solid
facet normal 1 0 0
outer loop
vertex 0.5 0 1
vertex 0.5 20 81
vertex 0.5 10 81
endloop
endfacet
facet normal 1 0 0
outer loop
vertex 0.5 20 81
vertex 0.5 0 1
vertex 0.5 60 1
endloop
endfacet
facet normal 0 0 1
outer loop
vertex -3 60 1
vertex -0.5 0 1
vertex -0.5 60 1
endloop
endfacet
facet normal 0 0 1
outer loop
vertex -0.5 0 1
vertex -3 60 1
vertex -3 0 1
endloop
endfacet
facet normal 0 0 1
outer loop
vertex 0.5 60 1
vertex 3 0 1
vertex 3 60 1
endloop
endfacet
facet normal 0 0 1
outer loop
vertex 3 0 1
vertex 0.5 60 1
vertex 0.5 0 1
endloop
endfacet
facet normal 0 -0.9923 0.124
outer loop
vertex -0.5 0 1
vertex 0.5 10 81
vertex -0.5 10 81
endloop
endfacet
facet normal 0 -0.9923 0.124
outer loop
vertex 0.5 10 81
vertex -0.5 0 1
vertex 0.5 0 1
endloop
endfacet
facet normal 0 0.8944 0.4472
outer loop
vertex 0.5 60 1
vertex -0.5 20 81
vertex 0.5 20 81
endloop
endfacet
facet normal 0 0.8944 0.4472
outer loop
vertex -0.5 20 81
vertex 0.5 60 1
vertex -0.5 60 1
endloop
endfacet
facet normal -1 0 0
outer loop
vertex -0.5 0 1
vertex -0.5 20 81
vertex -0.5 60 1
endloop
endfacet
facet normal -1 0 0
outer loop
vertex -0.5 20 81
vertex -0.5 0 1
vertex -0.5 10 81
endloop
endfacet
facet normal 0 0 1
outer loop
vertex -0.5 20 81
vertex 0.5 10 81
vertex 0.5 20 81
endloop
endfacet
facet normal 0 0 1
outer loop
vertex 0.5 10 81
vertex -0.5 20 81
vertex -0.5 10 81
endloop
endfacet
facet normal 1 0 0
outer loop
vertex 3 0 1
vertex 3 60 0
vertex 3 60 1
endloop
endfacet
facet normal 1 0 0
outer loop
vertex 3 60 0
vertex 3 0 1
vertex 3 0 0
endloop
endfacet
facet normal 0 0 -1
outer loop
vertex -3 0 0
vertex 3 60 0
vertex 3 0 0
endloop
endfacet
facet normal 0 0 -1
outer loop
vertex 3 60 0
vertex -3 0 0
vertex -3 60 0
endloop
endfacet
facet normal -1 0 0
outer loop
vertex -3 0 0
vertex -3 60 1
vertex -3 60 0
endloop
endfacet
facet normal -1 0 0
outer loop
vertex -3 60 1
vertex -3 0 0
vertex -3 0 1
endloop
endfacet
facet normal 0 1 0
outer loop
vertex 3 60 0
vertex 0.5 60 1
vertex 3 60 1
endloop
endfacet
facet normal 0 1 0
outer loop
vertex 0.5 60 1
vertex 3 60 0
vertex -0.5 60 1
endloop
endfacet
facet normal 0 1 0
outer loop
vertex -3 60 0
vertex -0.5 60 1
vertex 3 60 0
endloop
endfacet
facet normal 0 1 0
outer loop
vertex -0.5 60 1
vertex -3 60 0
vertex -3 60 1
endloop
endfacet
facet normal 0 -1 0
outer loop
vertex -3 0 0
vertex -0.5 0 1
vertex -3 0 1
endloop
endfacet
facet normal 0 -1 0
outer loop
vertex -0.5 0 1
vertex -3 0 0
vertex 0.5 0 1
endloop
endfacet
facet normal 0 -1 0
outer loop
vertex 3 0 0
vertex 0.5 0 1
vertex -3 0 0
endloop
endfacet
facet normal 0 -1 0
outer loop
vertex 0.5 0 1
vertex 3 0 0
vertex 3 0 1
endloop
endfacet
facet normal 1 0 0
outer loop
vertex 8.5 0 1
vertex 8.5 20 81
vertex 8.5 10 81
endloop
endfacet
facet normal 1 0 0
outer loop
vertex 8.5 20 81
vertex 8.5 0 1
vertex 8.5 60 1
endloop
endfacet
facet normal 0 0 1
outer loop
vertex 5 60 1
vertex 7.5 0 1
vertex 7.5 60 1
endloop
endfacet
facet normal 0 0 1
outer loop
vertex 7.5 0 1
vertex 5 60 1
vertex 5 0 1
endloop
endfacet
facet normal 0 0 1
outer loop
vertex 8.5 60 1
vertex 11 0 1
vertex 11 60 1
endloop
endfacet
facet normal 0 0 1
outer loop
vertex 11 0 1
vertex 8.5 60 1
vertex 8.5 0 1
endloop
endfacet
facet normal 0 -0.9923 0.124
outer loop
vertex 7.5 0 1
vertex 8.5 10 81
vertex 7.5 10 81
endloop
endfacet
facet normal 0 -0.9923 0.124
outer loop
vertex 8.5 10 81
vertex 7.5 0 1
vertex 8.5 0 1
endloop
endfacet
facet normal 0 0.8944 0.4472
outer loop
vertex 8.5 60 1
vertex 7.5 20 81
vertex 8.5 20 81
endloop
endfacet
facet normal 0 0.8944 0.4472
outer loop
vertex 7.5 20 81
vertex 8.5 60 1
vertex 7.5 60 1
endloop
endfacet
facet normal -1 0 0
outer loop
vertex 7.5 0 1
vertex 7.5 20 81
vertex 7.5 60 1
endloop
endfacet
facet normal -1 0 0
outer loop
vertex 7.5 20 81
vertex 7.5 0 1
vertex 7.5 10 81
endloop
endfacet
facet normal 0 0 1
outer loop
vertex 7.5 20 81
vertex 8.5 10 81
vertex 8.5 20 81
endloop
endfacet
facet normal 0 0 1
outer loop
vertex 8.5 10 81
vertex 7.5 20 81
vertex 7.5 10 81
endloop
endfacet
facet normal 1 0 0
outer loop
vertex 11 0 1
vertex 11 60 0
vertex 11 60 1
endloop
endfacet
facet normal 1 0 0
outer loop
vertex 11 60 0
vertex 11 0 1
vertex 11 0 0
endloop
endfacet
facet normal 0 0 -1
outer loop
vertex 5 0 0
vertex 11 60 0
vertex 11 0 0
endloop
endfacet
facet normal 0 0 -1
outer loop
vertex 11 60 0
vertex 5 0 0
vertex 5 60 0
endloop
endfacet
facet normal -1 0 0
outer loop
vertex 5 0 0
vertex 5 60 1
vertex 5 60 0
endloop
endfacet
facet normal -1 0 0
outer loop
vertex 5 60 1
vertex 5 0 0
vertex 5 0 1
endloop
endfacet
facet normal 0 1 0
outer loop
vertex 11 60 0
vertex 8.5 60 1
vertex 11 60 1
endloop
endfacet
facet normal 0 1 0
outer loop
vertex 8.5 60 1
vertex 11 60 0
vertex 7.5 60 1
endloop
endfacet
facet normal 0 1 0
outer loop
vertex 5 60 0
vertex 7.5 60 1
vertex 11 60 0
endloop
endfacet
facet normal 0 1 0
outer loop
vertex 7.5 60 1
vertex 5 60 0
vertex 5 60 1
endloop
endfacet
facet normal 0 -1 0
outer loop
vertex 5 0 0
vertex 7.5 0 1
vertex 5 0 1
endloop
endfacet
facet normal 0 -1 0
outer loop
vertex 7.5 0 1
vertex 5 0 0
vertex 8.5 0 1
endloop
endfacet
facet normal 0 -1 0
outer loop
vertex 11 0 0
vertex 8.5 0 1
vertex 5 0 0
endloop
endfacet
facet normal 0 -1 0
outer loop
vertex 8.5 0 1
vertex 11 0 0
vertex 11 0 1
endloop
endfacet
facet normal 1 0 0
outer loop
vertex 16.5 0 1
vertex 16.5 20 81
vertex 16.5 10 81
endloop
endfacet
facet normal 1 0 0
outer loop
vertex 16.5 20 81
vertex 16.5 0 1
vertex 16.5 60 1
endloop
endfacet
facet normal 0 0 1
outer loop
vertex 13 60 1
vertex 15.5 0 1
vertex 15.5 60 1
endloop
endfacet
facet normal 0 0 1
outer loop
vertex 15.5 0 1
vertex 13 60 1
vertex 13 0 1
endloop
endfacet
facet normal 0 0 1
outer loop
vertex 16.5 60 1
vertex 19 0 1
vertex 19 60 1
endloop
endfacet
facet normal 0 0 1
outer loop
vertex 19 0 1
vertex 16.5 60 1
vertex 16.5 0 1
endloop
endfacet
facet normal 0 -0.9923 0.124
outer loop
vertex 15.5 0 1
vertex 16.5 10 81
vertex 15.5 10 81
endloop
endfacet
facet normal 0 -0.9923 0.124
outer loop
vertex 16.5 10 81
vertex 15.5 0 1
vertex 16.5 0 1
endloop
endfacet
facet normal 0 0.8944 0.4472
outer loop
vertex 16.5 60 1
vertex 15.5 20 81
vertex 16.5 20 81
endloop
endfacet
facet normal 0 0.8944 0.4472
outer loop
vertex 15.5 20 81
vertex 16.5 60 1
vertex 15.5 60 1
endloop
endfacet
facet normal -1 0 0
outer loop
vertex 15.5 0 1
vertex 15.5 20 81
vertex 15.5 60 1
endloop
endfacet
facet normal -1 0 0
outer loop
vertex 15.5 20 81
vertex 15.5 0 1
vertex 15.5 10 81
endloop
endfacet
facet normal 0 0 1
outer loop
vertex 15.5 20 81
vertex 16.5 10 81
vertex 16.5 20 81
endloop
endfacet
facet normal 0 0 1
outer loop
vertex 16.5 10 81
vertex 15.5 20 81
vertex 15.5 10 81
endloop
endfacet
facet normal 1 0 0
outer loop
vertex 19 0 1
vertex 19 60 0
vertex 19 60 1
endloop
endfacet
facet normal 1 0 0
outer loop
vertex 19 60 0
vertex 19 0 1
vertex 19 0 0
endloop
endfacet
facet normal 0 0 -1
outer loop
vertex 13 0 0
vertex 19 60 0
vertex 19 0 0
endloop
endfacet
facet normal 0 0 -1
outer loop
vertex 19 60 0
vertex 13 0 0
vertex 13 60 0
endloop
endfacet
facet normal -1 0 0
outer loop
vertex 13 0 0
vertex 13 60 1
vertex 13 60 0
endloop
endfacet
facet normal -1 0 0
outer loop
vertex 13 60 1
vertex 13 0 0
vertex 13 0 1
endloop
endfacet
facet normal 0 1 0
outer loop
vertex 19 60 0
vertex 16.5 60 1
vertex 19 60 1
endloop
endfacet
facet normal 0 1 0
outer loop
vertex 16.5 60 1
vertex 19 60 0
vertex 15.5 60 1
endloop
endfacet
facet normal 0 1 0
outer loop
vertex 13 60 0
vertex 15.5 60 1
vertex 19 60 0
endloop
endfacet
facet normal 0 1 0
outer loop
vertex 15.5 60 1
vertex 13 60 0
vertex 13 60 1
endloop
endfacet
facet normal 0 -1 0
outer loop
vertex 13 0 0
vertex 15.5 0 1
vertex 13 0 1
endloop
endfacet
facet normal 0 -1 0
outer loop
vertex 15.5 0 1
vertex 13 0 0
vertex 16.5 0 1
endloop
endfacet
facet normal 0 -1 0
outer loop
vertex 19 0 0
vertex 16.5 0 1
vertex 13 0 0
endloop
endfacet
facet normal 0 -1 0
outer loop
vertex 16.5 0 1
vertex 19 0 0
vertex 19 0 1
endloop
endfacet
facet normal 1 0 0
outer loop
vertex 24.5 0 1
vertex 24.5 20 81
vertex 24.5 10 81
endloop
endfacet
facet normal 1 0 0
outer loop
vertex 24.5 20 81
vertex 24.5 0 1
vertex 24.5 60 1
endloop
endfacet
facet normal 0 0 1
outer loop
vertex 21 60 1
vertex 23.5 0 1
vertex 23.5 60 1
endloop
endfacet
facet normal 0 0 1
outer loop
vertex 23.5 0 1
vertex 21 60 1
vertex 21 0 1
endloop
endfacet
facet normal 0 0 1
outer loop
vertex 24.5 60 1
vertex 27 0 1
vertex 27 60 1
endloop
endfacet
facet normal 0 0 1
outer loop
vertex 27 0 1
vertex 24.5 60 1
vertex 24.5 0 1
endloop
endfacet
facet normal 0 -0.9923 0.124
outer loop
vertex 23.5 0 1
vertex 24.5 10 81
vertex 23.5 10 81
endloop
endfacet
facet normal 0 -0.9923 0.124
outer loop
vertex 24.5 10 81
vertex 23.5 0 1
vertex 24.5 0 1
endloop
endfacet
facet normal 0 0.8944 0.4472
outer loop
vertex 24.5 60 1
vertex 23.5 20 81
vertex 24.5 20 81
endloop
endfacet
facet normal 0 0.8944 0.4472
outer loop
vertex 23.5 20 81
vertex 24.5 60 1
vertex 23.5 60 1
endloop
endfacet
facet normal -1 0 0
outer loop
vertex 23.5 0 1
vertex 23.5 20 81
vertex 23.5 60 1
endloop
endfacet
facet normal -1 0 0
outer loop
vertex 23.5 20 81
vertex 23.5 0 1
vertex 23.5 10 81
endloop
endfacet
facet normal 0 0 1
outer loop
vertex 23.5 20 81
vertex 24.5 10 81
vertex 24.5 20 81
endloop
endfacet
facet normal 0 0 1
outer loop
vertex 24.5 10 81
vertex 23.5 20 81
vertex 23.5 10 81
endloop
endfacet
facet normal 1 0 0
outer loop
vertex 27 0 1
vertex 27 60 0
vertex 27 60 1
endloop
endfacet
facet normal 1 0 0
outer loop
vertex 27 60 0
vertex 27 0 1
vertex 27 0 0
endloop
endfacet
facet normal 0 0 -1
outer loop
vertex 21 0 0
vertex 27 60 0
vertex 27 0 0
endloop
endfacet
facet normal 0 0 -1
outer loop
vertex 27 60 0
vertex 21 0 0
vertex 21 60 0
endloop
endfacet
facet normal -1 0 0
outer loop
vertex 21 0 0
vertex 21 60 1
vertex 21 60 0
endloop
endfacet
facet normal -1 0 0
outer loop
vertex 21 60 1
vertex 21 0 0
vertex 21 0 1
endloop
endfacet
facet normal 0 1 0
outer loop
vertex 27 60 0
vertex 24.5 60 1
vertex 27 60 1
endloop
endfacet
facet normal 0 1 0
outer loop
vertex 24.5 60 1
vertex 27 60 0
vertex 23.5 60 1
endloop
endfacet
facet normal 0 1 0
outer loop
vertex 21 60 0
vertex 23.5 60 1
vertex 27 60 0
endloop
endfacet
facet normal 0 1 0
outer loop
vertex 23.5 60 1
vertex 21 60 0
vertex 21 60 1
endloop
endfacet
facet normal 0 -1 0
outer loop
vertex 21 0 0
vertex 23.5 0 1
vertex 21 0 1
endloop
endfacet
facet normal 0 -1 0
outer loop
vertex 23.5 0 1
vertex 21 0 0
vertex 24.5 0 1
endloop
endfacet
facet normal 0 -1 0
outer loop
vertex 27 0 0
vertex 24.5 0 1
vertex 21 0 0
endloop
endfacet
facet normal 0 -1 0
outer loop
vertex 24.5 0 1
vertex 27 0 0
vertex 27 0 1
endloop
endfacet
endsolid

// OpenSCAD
module fin()
{
  translate([1/2, 0, 1])
    rotate([0, -90, 0])
      linear_extrude(1)
        polygon(points=[
          [ 0,  0],
          [80, 10],
          [80, 20],
          [ 0, 60]
        ]);
  // base
  translate([-6/2, 0, 0])
    cube([6, 60, 1]);
}

for(i=[0:3])
  translate([i*8, 0, 0])
    fin();
